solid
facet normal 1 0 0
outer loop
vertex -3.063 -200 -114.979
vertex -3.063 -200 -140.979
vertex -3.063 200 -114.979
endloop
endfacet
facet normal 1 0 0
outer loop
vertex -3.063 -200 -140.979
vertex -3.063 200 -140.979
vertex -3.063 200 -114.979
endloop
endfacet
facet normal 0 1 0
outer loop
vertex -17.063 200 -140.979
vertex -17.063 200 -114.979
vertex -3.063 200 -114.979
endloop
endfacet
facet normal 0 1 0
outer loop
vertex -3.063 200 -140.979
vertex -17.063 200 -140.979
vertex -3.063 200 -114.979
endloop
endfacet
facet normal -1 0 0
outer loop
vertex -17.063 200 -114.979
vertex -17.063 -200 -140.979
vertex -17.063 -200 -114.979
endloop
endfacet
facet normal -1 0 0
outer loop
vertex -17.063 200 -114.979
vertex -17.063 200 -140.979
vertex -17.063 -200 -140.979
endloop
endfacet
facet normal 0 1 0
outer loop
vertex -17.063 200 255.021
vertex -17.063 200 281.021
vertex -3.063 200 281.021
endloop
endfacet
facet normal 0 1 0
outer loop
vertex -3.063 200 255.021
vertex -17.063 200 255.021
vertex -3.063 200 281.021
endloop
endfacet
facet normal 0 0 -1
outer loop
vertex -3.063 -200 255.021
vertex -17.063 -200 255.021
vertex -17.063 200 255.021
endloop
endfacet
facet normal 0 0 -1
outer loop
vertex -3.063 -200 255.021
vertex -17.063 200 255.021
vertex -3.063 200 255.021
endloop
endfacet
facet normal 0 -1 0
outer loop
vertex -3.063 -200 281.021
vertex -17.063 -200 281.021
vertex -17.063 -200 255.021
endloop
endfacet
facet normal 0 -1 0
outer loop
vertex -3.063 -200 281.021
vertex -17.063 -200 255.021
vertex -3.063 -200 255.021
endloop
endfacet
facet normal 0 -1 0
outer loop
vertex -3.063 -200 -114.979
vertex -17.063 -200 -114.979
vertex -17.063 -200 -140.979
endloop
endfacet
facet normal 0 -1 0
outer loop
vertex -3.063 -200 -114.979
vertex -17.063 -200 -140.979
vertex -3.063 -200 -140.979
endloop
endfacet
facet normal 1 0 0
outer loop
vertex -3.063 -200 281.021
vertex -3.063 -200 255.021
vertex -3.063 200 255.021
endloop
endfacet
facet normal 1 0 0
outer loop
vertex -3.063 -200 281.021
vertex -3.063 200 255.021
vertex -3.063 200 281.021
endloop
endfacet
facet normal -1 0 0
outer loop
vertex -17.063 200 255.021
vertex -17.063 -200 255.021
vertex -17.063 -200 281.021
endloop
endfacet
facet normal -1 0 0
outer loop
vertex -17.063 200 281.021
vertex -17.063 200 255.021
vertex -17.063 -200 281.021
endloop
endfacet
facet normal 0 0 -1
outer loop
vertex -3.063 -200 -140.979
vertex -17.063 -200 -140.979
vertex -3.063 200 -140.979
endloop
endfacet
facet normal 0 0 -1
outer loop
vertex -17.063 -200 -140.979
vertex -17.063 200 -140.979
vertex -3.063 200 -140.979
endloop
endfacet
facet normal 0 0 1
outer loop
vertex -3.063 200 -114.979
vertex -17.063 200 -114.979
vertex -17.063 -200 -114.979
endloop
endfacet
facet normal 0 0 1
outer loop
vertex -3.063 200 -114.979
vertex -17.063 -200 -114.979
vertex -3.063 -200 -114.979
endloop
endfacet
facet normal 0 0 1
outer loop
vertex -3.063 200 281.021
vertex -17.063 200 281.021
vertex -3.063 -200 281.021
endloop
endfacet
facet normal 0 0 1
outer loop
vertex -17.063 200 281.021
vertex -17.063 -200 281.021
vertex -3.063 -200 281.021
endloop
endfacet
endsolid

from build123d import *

# Parameters (mm, degrees)
F0_W     = 14
F0_H     = 26
F1_DEPTH = 200


with BuildPart() as f1:
    # F0 (on Front) → F1 (new body, symmetric)
    with BuildSketch(Plane.XZ):
        with Locations((-10.063001, -127.979211)):
            Rectangle(F0_W, F0_H)
        with Locations((-10.063001, 268.020789)):
            Rectangle(F0_W, F0_H)
    extrude(amount=F1_DEPTH, both=True)


solid = f1.part
